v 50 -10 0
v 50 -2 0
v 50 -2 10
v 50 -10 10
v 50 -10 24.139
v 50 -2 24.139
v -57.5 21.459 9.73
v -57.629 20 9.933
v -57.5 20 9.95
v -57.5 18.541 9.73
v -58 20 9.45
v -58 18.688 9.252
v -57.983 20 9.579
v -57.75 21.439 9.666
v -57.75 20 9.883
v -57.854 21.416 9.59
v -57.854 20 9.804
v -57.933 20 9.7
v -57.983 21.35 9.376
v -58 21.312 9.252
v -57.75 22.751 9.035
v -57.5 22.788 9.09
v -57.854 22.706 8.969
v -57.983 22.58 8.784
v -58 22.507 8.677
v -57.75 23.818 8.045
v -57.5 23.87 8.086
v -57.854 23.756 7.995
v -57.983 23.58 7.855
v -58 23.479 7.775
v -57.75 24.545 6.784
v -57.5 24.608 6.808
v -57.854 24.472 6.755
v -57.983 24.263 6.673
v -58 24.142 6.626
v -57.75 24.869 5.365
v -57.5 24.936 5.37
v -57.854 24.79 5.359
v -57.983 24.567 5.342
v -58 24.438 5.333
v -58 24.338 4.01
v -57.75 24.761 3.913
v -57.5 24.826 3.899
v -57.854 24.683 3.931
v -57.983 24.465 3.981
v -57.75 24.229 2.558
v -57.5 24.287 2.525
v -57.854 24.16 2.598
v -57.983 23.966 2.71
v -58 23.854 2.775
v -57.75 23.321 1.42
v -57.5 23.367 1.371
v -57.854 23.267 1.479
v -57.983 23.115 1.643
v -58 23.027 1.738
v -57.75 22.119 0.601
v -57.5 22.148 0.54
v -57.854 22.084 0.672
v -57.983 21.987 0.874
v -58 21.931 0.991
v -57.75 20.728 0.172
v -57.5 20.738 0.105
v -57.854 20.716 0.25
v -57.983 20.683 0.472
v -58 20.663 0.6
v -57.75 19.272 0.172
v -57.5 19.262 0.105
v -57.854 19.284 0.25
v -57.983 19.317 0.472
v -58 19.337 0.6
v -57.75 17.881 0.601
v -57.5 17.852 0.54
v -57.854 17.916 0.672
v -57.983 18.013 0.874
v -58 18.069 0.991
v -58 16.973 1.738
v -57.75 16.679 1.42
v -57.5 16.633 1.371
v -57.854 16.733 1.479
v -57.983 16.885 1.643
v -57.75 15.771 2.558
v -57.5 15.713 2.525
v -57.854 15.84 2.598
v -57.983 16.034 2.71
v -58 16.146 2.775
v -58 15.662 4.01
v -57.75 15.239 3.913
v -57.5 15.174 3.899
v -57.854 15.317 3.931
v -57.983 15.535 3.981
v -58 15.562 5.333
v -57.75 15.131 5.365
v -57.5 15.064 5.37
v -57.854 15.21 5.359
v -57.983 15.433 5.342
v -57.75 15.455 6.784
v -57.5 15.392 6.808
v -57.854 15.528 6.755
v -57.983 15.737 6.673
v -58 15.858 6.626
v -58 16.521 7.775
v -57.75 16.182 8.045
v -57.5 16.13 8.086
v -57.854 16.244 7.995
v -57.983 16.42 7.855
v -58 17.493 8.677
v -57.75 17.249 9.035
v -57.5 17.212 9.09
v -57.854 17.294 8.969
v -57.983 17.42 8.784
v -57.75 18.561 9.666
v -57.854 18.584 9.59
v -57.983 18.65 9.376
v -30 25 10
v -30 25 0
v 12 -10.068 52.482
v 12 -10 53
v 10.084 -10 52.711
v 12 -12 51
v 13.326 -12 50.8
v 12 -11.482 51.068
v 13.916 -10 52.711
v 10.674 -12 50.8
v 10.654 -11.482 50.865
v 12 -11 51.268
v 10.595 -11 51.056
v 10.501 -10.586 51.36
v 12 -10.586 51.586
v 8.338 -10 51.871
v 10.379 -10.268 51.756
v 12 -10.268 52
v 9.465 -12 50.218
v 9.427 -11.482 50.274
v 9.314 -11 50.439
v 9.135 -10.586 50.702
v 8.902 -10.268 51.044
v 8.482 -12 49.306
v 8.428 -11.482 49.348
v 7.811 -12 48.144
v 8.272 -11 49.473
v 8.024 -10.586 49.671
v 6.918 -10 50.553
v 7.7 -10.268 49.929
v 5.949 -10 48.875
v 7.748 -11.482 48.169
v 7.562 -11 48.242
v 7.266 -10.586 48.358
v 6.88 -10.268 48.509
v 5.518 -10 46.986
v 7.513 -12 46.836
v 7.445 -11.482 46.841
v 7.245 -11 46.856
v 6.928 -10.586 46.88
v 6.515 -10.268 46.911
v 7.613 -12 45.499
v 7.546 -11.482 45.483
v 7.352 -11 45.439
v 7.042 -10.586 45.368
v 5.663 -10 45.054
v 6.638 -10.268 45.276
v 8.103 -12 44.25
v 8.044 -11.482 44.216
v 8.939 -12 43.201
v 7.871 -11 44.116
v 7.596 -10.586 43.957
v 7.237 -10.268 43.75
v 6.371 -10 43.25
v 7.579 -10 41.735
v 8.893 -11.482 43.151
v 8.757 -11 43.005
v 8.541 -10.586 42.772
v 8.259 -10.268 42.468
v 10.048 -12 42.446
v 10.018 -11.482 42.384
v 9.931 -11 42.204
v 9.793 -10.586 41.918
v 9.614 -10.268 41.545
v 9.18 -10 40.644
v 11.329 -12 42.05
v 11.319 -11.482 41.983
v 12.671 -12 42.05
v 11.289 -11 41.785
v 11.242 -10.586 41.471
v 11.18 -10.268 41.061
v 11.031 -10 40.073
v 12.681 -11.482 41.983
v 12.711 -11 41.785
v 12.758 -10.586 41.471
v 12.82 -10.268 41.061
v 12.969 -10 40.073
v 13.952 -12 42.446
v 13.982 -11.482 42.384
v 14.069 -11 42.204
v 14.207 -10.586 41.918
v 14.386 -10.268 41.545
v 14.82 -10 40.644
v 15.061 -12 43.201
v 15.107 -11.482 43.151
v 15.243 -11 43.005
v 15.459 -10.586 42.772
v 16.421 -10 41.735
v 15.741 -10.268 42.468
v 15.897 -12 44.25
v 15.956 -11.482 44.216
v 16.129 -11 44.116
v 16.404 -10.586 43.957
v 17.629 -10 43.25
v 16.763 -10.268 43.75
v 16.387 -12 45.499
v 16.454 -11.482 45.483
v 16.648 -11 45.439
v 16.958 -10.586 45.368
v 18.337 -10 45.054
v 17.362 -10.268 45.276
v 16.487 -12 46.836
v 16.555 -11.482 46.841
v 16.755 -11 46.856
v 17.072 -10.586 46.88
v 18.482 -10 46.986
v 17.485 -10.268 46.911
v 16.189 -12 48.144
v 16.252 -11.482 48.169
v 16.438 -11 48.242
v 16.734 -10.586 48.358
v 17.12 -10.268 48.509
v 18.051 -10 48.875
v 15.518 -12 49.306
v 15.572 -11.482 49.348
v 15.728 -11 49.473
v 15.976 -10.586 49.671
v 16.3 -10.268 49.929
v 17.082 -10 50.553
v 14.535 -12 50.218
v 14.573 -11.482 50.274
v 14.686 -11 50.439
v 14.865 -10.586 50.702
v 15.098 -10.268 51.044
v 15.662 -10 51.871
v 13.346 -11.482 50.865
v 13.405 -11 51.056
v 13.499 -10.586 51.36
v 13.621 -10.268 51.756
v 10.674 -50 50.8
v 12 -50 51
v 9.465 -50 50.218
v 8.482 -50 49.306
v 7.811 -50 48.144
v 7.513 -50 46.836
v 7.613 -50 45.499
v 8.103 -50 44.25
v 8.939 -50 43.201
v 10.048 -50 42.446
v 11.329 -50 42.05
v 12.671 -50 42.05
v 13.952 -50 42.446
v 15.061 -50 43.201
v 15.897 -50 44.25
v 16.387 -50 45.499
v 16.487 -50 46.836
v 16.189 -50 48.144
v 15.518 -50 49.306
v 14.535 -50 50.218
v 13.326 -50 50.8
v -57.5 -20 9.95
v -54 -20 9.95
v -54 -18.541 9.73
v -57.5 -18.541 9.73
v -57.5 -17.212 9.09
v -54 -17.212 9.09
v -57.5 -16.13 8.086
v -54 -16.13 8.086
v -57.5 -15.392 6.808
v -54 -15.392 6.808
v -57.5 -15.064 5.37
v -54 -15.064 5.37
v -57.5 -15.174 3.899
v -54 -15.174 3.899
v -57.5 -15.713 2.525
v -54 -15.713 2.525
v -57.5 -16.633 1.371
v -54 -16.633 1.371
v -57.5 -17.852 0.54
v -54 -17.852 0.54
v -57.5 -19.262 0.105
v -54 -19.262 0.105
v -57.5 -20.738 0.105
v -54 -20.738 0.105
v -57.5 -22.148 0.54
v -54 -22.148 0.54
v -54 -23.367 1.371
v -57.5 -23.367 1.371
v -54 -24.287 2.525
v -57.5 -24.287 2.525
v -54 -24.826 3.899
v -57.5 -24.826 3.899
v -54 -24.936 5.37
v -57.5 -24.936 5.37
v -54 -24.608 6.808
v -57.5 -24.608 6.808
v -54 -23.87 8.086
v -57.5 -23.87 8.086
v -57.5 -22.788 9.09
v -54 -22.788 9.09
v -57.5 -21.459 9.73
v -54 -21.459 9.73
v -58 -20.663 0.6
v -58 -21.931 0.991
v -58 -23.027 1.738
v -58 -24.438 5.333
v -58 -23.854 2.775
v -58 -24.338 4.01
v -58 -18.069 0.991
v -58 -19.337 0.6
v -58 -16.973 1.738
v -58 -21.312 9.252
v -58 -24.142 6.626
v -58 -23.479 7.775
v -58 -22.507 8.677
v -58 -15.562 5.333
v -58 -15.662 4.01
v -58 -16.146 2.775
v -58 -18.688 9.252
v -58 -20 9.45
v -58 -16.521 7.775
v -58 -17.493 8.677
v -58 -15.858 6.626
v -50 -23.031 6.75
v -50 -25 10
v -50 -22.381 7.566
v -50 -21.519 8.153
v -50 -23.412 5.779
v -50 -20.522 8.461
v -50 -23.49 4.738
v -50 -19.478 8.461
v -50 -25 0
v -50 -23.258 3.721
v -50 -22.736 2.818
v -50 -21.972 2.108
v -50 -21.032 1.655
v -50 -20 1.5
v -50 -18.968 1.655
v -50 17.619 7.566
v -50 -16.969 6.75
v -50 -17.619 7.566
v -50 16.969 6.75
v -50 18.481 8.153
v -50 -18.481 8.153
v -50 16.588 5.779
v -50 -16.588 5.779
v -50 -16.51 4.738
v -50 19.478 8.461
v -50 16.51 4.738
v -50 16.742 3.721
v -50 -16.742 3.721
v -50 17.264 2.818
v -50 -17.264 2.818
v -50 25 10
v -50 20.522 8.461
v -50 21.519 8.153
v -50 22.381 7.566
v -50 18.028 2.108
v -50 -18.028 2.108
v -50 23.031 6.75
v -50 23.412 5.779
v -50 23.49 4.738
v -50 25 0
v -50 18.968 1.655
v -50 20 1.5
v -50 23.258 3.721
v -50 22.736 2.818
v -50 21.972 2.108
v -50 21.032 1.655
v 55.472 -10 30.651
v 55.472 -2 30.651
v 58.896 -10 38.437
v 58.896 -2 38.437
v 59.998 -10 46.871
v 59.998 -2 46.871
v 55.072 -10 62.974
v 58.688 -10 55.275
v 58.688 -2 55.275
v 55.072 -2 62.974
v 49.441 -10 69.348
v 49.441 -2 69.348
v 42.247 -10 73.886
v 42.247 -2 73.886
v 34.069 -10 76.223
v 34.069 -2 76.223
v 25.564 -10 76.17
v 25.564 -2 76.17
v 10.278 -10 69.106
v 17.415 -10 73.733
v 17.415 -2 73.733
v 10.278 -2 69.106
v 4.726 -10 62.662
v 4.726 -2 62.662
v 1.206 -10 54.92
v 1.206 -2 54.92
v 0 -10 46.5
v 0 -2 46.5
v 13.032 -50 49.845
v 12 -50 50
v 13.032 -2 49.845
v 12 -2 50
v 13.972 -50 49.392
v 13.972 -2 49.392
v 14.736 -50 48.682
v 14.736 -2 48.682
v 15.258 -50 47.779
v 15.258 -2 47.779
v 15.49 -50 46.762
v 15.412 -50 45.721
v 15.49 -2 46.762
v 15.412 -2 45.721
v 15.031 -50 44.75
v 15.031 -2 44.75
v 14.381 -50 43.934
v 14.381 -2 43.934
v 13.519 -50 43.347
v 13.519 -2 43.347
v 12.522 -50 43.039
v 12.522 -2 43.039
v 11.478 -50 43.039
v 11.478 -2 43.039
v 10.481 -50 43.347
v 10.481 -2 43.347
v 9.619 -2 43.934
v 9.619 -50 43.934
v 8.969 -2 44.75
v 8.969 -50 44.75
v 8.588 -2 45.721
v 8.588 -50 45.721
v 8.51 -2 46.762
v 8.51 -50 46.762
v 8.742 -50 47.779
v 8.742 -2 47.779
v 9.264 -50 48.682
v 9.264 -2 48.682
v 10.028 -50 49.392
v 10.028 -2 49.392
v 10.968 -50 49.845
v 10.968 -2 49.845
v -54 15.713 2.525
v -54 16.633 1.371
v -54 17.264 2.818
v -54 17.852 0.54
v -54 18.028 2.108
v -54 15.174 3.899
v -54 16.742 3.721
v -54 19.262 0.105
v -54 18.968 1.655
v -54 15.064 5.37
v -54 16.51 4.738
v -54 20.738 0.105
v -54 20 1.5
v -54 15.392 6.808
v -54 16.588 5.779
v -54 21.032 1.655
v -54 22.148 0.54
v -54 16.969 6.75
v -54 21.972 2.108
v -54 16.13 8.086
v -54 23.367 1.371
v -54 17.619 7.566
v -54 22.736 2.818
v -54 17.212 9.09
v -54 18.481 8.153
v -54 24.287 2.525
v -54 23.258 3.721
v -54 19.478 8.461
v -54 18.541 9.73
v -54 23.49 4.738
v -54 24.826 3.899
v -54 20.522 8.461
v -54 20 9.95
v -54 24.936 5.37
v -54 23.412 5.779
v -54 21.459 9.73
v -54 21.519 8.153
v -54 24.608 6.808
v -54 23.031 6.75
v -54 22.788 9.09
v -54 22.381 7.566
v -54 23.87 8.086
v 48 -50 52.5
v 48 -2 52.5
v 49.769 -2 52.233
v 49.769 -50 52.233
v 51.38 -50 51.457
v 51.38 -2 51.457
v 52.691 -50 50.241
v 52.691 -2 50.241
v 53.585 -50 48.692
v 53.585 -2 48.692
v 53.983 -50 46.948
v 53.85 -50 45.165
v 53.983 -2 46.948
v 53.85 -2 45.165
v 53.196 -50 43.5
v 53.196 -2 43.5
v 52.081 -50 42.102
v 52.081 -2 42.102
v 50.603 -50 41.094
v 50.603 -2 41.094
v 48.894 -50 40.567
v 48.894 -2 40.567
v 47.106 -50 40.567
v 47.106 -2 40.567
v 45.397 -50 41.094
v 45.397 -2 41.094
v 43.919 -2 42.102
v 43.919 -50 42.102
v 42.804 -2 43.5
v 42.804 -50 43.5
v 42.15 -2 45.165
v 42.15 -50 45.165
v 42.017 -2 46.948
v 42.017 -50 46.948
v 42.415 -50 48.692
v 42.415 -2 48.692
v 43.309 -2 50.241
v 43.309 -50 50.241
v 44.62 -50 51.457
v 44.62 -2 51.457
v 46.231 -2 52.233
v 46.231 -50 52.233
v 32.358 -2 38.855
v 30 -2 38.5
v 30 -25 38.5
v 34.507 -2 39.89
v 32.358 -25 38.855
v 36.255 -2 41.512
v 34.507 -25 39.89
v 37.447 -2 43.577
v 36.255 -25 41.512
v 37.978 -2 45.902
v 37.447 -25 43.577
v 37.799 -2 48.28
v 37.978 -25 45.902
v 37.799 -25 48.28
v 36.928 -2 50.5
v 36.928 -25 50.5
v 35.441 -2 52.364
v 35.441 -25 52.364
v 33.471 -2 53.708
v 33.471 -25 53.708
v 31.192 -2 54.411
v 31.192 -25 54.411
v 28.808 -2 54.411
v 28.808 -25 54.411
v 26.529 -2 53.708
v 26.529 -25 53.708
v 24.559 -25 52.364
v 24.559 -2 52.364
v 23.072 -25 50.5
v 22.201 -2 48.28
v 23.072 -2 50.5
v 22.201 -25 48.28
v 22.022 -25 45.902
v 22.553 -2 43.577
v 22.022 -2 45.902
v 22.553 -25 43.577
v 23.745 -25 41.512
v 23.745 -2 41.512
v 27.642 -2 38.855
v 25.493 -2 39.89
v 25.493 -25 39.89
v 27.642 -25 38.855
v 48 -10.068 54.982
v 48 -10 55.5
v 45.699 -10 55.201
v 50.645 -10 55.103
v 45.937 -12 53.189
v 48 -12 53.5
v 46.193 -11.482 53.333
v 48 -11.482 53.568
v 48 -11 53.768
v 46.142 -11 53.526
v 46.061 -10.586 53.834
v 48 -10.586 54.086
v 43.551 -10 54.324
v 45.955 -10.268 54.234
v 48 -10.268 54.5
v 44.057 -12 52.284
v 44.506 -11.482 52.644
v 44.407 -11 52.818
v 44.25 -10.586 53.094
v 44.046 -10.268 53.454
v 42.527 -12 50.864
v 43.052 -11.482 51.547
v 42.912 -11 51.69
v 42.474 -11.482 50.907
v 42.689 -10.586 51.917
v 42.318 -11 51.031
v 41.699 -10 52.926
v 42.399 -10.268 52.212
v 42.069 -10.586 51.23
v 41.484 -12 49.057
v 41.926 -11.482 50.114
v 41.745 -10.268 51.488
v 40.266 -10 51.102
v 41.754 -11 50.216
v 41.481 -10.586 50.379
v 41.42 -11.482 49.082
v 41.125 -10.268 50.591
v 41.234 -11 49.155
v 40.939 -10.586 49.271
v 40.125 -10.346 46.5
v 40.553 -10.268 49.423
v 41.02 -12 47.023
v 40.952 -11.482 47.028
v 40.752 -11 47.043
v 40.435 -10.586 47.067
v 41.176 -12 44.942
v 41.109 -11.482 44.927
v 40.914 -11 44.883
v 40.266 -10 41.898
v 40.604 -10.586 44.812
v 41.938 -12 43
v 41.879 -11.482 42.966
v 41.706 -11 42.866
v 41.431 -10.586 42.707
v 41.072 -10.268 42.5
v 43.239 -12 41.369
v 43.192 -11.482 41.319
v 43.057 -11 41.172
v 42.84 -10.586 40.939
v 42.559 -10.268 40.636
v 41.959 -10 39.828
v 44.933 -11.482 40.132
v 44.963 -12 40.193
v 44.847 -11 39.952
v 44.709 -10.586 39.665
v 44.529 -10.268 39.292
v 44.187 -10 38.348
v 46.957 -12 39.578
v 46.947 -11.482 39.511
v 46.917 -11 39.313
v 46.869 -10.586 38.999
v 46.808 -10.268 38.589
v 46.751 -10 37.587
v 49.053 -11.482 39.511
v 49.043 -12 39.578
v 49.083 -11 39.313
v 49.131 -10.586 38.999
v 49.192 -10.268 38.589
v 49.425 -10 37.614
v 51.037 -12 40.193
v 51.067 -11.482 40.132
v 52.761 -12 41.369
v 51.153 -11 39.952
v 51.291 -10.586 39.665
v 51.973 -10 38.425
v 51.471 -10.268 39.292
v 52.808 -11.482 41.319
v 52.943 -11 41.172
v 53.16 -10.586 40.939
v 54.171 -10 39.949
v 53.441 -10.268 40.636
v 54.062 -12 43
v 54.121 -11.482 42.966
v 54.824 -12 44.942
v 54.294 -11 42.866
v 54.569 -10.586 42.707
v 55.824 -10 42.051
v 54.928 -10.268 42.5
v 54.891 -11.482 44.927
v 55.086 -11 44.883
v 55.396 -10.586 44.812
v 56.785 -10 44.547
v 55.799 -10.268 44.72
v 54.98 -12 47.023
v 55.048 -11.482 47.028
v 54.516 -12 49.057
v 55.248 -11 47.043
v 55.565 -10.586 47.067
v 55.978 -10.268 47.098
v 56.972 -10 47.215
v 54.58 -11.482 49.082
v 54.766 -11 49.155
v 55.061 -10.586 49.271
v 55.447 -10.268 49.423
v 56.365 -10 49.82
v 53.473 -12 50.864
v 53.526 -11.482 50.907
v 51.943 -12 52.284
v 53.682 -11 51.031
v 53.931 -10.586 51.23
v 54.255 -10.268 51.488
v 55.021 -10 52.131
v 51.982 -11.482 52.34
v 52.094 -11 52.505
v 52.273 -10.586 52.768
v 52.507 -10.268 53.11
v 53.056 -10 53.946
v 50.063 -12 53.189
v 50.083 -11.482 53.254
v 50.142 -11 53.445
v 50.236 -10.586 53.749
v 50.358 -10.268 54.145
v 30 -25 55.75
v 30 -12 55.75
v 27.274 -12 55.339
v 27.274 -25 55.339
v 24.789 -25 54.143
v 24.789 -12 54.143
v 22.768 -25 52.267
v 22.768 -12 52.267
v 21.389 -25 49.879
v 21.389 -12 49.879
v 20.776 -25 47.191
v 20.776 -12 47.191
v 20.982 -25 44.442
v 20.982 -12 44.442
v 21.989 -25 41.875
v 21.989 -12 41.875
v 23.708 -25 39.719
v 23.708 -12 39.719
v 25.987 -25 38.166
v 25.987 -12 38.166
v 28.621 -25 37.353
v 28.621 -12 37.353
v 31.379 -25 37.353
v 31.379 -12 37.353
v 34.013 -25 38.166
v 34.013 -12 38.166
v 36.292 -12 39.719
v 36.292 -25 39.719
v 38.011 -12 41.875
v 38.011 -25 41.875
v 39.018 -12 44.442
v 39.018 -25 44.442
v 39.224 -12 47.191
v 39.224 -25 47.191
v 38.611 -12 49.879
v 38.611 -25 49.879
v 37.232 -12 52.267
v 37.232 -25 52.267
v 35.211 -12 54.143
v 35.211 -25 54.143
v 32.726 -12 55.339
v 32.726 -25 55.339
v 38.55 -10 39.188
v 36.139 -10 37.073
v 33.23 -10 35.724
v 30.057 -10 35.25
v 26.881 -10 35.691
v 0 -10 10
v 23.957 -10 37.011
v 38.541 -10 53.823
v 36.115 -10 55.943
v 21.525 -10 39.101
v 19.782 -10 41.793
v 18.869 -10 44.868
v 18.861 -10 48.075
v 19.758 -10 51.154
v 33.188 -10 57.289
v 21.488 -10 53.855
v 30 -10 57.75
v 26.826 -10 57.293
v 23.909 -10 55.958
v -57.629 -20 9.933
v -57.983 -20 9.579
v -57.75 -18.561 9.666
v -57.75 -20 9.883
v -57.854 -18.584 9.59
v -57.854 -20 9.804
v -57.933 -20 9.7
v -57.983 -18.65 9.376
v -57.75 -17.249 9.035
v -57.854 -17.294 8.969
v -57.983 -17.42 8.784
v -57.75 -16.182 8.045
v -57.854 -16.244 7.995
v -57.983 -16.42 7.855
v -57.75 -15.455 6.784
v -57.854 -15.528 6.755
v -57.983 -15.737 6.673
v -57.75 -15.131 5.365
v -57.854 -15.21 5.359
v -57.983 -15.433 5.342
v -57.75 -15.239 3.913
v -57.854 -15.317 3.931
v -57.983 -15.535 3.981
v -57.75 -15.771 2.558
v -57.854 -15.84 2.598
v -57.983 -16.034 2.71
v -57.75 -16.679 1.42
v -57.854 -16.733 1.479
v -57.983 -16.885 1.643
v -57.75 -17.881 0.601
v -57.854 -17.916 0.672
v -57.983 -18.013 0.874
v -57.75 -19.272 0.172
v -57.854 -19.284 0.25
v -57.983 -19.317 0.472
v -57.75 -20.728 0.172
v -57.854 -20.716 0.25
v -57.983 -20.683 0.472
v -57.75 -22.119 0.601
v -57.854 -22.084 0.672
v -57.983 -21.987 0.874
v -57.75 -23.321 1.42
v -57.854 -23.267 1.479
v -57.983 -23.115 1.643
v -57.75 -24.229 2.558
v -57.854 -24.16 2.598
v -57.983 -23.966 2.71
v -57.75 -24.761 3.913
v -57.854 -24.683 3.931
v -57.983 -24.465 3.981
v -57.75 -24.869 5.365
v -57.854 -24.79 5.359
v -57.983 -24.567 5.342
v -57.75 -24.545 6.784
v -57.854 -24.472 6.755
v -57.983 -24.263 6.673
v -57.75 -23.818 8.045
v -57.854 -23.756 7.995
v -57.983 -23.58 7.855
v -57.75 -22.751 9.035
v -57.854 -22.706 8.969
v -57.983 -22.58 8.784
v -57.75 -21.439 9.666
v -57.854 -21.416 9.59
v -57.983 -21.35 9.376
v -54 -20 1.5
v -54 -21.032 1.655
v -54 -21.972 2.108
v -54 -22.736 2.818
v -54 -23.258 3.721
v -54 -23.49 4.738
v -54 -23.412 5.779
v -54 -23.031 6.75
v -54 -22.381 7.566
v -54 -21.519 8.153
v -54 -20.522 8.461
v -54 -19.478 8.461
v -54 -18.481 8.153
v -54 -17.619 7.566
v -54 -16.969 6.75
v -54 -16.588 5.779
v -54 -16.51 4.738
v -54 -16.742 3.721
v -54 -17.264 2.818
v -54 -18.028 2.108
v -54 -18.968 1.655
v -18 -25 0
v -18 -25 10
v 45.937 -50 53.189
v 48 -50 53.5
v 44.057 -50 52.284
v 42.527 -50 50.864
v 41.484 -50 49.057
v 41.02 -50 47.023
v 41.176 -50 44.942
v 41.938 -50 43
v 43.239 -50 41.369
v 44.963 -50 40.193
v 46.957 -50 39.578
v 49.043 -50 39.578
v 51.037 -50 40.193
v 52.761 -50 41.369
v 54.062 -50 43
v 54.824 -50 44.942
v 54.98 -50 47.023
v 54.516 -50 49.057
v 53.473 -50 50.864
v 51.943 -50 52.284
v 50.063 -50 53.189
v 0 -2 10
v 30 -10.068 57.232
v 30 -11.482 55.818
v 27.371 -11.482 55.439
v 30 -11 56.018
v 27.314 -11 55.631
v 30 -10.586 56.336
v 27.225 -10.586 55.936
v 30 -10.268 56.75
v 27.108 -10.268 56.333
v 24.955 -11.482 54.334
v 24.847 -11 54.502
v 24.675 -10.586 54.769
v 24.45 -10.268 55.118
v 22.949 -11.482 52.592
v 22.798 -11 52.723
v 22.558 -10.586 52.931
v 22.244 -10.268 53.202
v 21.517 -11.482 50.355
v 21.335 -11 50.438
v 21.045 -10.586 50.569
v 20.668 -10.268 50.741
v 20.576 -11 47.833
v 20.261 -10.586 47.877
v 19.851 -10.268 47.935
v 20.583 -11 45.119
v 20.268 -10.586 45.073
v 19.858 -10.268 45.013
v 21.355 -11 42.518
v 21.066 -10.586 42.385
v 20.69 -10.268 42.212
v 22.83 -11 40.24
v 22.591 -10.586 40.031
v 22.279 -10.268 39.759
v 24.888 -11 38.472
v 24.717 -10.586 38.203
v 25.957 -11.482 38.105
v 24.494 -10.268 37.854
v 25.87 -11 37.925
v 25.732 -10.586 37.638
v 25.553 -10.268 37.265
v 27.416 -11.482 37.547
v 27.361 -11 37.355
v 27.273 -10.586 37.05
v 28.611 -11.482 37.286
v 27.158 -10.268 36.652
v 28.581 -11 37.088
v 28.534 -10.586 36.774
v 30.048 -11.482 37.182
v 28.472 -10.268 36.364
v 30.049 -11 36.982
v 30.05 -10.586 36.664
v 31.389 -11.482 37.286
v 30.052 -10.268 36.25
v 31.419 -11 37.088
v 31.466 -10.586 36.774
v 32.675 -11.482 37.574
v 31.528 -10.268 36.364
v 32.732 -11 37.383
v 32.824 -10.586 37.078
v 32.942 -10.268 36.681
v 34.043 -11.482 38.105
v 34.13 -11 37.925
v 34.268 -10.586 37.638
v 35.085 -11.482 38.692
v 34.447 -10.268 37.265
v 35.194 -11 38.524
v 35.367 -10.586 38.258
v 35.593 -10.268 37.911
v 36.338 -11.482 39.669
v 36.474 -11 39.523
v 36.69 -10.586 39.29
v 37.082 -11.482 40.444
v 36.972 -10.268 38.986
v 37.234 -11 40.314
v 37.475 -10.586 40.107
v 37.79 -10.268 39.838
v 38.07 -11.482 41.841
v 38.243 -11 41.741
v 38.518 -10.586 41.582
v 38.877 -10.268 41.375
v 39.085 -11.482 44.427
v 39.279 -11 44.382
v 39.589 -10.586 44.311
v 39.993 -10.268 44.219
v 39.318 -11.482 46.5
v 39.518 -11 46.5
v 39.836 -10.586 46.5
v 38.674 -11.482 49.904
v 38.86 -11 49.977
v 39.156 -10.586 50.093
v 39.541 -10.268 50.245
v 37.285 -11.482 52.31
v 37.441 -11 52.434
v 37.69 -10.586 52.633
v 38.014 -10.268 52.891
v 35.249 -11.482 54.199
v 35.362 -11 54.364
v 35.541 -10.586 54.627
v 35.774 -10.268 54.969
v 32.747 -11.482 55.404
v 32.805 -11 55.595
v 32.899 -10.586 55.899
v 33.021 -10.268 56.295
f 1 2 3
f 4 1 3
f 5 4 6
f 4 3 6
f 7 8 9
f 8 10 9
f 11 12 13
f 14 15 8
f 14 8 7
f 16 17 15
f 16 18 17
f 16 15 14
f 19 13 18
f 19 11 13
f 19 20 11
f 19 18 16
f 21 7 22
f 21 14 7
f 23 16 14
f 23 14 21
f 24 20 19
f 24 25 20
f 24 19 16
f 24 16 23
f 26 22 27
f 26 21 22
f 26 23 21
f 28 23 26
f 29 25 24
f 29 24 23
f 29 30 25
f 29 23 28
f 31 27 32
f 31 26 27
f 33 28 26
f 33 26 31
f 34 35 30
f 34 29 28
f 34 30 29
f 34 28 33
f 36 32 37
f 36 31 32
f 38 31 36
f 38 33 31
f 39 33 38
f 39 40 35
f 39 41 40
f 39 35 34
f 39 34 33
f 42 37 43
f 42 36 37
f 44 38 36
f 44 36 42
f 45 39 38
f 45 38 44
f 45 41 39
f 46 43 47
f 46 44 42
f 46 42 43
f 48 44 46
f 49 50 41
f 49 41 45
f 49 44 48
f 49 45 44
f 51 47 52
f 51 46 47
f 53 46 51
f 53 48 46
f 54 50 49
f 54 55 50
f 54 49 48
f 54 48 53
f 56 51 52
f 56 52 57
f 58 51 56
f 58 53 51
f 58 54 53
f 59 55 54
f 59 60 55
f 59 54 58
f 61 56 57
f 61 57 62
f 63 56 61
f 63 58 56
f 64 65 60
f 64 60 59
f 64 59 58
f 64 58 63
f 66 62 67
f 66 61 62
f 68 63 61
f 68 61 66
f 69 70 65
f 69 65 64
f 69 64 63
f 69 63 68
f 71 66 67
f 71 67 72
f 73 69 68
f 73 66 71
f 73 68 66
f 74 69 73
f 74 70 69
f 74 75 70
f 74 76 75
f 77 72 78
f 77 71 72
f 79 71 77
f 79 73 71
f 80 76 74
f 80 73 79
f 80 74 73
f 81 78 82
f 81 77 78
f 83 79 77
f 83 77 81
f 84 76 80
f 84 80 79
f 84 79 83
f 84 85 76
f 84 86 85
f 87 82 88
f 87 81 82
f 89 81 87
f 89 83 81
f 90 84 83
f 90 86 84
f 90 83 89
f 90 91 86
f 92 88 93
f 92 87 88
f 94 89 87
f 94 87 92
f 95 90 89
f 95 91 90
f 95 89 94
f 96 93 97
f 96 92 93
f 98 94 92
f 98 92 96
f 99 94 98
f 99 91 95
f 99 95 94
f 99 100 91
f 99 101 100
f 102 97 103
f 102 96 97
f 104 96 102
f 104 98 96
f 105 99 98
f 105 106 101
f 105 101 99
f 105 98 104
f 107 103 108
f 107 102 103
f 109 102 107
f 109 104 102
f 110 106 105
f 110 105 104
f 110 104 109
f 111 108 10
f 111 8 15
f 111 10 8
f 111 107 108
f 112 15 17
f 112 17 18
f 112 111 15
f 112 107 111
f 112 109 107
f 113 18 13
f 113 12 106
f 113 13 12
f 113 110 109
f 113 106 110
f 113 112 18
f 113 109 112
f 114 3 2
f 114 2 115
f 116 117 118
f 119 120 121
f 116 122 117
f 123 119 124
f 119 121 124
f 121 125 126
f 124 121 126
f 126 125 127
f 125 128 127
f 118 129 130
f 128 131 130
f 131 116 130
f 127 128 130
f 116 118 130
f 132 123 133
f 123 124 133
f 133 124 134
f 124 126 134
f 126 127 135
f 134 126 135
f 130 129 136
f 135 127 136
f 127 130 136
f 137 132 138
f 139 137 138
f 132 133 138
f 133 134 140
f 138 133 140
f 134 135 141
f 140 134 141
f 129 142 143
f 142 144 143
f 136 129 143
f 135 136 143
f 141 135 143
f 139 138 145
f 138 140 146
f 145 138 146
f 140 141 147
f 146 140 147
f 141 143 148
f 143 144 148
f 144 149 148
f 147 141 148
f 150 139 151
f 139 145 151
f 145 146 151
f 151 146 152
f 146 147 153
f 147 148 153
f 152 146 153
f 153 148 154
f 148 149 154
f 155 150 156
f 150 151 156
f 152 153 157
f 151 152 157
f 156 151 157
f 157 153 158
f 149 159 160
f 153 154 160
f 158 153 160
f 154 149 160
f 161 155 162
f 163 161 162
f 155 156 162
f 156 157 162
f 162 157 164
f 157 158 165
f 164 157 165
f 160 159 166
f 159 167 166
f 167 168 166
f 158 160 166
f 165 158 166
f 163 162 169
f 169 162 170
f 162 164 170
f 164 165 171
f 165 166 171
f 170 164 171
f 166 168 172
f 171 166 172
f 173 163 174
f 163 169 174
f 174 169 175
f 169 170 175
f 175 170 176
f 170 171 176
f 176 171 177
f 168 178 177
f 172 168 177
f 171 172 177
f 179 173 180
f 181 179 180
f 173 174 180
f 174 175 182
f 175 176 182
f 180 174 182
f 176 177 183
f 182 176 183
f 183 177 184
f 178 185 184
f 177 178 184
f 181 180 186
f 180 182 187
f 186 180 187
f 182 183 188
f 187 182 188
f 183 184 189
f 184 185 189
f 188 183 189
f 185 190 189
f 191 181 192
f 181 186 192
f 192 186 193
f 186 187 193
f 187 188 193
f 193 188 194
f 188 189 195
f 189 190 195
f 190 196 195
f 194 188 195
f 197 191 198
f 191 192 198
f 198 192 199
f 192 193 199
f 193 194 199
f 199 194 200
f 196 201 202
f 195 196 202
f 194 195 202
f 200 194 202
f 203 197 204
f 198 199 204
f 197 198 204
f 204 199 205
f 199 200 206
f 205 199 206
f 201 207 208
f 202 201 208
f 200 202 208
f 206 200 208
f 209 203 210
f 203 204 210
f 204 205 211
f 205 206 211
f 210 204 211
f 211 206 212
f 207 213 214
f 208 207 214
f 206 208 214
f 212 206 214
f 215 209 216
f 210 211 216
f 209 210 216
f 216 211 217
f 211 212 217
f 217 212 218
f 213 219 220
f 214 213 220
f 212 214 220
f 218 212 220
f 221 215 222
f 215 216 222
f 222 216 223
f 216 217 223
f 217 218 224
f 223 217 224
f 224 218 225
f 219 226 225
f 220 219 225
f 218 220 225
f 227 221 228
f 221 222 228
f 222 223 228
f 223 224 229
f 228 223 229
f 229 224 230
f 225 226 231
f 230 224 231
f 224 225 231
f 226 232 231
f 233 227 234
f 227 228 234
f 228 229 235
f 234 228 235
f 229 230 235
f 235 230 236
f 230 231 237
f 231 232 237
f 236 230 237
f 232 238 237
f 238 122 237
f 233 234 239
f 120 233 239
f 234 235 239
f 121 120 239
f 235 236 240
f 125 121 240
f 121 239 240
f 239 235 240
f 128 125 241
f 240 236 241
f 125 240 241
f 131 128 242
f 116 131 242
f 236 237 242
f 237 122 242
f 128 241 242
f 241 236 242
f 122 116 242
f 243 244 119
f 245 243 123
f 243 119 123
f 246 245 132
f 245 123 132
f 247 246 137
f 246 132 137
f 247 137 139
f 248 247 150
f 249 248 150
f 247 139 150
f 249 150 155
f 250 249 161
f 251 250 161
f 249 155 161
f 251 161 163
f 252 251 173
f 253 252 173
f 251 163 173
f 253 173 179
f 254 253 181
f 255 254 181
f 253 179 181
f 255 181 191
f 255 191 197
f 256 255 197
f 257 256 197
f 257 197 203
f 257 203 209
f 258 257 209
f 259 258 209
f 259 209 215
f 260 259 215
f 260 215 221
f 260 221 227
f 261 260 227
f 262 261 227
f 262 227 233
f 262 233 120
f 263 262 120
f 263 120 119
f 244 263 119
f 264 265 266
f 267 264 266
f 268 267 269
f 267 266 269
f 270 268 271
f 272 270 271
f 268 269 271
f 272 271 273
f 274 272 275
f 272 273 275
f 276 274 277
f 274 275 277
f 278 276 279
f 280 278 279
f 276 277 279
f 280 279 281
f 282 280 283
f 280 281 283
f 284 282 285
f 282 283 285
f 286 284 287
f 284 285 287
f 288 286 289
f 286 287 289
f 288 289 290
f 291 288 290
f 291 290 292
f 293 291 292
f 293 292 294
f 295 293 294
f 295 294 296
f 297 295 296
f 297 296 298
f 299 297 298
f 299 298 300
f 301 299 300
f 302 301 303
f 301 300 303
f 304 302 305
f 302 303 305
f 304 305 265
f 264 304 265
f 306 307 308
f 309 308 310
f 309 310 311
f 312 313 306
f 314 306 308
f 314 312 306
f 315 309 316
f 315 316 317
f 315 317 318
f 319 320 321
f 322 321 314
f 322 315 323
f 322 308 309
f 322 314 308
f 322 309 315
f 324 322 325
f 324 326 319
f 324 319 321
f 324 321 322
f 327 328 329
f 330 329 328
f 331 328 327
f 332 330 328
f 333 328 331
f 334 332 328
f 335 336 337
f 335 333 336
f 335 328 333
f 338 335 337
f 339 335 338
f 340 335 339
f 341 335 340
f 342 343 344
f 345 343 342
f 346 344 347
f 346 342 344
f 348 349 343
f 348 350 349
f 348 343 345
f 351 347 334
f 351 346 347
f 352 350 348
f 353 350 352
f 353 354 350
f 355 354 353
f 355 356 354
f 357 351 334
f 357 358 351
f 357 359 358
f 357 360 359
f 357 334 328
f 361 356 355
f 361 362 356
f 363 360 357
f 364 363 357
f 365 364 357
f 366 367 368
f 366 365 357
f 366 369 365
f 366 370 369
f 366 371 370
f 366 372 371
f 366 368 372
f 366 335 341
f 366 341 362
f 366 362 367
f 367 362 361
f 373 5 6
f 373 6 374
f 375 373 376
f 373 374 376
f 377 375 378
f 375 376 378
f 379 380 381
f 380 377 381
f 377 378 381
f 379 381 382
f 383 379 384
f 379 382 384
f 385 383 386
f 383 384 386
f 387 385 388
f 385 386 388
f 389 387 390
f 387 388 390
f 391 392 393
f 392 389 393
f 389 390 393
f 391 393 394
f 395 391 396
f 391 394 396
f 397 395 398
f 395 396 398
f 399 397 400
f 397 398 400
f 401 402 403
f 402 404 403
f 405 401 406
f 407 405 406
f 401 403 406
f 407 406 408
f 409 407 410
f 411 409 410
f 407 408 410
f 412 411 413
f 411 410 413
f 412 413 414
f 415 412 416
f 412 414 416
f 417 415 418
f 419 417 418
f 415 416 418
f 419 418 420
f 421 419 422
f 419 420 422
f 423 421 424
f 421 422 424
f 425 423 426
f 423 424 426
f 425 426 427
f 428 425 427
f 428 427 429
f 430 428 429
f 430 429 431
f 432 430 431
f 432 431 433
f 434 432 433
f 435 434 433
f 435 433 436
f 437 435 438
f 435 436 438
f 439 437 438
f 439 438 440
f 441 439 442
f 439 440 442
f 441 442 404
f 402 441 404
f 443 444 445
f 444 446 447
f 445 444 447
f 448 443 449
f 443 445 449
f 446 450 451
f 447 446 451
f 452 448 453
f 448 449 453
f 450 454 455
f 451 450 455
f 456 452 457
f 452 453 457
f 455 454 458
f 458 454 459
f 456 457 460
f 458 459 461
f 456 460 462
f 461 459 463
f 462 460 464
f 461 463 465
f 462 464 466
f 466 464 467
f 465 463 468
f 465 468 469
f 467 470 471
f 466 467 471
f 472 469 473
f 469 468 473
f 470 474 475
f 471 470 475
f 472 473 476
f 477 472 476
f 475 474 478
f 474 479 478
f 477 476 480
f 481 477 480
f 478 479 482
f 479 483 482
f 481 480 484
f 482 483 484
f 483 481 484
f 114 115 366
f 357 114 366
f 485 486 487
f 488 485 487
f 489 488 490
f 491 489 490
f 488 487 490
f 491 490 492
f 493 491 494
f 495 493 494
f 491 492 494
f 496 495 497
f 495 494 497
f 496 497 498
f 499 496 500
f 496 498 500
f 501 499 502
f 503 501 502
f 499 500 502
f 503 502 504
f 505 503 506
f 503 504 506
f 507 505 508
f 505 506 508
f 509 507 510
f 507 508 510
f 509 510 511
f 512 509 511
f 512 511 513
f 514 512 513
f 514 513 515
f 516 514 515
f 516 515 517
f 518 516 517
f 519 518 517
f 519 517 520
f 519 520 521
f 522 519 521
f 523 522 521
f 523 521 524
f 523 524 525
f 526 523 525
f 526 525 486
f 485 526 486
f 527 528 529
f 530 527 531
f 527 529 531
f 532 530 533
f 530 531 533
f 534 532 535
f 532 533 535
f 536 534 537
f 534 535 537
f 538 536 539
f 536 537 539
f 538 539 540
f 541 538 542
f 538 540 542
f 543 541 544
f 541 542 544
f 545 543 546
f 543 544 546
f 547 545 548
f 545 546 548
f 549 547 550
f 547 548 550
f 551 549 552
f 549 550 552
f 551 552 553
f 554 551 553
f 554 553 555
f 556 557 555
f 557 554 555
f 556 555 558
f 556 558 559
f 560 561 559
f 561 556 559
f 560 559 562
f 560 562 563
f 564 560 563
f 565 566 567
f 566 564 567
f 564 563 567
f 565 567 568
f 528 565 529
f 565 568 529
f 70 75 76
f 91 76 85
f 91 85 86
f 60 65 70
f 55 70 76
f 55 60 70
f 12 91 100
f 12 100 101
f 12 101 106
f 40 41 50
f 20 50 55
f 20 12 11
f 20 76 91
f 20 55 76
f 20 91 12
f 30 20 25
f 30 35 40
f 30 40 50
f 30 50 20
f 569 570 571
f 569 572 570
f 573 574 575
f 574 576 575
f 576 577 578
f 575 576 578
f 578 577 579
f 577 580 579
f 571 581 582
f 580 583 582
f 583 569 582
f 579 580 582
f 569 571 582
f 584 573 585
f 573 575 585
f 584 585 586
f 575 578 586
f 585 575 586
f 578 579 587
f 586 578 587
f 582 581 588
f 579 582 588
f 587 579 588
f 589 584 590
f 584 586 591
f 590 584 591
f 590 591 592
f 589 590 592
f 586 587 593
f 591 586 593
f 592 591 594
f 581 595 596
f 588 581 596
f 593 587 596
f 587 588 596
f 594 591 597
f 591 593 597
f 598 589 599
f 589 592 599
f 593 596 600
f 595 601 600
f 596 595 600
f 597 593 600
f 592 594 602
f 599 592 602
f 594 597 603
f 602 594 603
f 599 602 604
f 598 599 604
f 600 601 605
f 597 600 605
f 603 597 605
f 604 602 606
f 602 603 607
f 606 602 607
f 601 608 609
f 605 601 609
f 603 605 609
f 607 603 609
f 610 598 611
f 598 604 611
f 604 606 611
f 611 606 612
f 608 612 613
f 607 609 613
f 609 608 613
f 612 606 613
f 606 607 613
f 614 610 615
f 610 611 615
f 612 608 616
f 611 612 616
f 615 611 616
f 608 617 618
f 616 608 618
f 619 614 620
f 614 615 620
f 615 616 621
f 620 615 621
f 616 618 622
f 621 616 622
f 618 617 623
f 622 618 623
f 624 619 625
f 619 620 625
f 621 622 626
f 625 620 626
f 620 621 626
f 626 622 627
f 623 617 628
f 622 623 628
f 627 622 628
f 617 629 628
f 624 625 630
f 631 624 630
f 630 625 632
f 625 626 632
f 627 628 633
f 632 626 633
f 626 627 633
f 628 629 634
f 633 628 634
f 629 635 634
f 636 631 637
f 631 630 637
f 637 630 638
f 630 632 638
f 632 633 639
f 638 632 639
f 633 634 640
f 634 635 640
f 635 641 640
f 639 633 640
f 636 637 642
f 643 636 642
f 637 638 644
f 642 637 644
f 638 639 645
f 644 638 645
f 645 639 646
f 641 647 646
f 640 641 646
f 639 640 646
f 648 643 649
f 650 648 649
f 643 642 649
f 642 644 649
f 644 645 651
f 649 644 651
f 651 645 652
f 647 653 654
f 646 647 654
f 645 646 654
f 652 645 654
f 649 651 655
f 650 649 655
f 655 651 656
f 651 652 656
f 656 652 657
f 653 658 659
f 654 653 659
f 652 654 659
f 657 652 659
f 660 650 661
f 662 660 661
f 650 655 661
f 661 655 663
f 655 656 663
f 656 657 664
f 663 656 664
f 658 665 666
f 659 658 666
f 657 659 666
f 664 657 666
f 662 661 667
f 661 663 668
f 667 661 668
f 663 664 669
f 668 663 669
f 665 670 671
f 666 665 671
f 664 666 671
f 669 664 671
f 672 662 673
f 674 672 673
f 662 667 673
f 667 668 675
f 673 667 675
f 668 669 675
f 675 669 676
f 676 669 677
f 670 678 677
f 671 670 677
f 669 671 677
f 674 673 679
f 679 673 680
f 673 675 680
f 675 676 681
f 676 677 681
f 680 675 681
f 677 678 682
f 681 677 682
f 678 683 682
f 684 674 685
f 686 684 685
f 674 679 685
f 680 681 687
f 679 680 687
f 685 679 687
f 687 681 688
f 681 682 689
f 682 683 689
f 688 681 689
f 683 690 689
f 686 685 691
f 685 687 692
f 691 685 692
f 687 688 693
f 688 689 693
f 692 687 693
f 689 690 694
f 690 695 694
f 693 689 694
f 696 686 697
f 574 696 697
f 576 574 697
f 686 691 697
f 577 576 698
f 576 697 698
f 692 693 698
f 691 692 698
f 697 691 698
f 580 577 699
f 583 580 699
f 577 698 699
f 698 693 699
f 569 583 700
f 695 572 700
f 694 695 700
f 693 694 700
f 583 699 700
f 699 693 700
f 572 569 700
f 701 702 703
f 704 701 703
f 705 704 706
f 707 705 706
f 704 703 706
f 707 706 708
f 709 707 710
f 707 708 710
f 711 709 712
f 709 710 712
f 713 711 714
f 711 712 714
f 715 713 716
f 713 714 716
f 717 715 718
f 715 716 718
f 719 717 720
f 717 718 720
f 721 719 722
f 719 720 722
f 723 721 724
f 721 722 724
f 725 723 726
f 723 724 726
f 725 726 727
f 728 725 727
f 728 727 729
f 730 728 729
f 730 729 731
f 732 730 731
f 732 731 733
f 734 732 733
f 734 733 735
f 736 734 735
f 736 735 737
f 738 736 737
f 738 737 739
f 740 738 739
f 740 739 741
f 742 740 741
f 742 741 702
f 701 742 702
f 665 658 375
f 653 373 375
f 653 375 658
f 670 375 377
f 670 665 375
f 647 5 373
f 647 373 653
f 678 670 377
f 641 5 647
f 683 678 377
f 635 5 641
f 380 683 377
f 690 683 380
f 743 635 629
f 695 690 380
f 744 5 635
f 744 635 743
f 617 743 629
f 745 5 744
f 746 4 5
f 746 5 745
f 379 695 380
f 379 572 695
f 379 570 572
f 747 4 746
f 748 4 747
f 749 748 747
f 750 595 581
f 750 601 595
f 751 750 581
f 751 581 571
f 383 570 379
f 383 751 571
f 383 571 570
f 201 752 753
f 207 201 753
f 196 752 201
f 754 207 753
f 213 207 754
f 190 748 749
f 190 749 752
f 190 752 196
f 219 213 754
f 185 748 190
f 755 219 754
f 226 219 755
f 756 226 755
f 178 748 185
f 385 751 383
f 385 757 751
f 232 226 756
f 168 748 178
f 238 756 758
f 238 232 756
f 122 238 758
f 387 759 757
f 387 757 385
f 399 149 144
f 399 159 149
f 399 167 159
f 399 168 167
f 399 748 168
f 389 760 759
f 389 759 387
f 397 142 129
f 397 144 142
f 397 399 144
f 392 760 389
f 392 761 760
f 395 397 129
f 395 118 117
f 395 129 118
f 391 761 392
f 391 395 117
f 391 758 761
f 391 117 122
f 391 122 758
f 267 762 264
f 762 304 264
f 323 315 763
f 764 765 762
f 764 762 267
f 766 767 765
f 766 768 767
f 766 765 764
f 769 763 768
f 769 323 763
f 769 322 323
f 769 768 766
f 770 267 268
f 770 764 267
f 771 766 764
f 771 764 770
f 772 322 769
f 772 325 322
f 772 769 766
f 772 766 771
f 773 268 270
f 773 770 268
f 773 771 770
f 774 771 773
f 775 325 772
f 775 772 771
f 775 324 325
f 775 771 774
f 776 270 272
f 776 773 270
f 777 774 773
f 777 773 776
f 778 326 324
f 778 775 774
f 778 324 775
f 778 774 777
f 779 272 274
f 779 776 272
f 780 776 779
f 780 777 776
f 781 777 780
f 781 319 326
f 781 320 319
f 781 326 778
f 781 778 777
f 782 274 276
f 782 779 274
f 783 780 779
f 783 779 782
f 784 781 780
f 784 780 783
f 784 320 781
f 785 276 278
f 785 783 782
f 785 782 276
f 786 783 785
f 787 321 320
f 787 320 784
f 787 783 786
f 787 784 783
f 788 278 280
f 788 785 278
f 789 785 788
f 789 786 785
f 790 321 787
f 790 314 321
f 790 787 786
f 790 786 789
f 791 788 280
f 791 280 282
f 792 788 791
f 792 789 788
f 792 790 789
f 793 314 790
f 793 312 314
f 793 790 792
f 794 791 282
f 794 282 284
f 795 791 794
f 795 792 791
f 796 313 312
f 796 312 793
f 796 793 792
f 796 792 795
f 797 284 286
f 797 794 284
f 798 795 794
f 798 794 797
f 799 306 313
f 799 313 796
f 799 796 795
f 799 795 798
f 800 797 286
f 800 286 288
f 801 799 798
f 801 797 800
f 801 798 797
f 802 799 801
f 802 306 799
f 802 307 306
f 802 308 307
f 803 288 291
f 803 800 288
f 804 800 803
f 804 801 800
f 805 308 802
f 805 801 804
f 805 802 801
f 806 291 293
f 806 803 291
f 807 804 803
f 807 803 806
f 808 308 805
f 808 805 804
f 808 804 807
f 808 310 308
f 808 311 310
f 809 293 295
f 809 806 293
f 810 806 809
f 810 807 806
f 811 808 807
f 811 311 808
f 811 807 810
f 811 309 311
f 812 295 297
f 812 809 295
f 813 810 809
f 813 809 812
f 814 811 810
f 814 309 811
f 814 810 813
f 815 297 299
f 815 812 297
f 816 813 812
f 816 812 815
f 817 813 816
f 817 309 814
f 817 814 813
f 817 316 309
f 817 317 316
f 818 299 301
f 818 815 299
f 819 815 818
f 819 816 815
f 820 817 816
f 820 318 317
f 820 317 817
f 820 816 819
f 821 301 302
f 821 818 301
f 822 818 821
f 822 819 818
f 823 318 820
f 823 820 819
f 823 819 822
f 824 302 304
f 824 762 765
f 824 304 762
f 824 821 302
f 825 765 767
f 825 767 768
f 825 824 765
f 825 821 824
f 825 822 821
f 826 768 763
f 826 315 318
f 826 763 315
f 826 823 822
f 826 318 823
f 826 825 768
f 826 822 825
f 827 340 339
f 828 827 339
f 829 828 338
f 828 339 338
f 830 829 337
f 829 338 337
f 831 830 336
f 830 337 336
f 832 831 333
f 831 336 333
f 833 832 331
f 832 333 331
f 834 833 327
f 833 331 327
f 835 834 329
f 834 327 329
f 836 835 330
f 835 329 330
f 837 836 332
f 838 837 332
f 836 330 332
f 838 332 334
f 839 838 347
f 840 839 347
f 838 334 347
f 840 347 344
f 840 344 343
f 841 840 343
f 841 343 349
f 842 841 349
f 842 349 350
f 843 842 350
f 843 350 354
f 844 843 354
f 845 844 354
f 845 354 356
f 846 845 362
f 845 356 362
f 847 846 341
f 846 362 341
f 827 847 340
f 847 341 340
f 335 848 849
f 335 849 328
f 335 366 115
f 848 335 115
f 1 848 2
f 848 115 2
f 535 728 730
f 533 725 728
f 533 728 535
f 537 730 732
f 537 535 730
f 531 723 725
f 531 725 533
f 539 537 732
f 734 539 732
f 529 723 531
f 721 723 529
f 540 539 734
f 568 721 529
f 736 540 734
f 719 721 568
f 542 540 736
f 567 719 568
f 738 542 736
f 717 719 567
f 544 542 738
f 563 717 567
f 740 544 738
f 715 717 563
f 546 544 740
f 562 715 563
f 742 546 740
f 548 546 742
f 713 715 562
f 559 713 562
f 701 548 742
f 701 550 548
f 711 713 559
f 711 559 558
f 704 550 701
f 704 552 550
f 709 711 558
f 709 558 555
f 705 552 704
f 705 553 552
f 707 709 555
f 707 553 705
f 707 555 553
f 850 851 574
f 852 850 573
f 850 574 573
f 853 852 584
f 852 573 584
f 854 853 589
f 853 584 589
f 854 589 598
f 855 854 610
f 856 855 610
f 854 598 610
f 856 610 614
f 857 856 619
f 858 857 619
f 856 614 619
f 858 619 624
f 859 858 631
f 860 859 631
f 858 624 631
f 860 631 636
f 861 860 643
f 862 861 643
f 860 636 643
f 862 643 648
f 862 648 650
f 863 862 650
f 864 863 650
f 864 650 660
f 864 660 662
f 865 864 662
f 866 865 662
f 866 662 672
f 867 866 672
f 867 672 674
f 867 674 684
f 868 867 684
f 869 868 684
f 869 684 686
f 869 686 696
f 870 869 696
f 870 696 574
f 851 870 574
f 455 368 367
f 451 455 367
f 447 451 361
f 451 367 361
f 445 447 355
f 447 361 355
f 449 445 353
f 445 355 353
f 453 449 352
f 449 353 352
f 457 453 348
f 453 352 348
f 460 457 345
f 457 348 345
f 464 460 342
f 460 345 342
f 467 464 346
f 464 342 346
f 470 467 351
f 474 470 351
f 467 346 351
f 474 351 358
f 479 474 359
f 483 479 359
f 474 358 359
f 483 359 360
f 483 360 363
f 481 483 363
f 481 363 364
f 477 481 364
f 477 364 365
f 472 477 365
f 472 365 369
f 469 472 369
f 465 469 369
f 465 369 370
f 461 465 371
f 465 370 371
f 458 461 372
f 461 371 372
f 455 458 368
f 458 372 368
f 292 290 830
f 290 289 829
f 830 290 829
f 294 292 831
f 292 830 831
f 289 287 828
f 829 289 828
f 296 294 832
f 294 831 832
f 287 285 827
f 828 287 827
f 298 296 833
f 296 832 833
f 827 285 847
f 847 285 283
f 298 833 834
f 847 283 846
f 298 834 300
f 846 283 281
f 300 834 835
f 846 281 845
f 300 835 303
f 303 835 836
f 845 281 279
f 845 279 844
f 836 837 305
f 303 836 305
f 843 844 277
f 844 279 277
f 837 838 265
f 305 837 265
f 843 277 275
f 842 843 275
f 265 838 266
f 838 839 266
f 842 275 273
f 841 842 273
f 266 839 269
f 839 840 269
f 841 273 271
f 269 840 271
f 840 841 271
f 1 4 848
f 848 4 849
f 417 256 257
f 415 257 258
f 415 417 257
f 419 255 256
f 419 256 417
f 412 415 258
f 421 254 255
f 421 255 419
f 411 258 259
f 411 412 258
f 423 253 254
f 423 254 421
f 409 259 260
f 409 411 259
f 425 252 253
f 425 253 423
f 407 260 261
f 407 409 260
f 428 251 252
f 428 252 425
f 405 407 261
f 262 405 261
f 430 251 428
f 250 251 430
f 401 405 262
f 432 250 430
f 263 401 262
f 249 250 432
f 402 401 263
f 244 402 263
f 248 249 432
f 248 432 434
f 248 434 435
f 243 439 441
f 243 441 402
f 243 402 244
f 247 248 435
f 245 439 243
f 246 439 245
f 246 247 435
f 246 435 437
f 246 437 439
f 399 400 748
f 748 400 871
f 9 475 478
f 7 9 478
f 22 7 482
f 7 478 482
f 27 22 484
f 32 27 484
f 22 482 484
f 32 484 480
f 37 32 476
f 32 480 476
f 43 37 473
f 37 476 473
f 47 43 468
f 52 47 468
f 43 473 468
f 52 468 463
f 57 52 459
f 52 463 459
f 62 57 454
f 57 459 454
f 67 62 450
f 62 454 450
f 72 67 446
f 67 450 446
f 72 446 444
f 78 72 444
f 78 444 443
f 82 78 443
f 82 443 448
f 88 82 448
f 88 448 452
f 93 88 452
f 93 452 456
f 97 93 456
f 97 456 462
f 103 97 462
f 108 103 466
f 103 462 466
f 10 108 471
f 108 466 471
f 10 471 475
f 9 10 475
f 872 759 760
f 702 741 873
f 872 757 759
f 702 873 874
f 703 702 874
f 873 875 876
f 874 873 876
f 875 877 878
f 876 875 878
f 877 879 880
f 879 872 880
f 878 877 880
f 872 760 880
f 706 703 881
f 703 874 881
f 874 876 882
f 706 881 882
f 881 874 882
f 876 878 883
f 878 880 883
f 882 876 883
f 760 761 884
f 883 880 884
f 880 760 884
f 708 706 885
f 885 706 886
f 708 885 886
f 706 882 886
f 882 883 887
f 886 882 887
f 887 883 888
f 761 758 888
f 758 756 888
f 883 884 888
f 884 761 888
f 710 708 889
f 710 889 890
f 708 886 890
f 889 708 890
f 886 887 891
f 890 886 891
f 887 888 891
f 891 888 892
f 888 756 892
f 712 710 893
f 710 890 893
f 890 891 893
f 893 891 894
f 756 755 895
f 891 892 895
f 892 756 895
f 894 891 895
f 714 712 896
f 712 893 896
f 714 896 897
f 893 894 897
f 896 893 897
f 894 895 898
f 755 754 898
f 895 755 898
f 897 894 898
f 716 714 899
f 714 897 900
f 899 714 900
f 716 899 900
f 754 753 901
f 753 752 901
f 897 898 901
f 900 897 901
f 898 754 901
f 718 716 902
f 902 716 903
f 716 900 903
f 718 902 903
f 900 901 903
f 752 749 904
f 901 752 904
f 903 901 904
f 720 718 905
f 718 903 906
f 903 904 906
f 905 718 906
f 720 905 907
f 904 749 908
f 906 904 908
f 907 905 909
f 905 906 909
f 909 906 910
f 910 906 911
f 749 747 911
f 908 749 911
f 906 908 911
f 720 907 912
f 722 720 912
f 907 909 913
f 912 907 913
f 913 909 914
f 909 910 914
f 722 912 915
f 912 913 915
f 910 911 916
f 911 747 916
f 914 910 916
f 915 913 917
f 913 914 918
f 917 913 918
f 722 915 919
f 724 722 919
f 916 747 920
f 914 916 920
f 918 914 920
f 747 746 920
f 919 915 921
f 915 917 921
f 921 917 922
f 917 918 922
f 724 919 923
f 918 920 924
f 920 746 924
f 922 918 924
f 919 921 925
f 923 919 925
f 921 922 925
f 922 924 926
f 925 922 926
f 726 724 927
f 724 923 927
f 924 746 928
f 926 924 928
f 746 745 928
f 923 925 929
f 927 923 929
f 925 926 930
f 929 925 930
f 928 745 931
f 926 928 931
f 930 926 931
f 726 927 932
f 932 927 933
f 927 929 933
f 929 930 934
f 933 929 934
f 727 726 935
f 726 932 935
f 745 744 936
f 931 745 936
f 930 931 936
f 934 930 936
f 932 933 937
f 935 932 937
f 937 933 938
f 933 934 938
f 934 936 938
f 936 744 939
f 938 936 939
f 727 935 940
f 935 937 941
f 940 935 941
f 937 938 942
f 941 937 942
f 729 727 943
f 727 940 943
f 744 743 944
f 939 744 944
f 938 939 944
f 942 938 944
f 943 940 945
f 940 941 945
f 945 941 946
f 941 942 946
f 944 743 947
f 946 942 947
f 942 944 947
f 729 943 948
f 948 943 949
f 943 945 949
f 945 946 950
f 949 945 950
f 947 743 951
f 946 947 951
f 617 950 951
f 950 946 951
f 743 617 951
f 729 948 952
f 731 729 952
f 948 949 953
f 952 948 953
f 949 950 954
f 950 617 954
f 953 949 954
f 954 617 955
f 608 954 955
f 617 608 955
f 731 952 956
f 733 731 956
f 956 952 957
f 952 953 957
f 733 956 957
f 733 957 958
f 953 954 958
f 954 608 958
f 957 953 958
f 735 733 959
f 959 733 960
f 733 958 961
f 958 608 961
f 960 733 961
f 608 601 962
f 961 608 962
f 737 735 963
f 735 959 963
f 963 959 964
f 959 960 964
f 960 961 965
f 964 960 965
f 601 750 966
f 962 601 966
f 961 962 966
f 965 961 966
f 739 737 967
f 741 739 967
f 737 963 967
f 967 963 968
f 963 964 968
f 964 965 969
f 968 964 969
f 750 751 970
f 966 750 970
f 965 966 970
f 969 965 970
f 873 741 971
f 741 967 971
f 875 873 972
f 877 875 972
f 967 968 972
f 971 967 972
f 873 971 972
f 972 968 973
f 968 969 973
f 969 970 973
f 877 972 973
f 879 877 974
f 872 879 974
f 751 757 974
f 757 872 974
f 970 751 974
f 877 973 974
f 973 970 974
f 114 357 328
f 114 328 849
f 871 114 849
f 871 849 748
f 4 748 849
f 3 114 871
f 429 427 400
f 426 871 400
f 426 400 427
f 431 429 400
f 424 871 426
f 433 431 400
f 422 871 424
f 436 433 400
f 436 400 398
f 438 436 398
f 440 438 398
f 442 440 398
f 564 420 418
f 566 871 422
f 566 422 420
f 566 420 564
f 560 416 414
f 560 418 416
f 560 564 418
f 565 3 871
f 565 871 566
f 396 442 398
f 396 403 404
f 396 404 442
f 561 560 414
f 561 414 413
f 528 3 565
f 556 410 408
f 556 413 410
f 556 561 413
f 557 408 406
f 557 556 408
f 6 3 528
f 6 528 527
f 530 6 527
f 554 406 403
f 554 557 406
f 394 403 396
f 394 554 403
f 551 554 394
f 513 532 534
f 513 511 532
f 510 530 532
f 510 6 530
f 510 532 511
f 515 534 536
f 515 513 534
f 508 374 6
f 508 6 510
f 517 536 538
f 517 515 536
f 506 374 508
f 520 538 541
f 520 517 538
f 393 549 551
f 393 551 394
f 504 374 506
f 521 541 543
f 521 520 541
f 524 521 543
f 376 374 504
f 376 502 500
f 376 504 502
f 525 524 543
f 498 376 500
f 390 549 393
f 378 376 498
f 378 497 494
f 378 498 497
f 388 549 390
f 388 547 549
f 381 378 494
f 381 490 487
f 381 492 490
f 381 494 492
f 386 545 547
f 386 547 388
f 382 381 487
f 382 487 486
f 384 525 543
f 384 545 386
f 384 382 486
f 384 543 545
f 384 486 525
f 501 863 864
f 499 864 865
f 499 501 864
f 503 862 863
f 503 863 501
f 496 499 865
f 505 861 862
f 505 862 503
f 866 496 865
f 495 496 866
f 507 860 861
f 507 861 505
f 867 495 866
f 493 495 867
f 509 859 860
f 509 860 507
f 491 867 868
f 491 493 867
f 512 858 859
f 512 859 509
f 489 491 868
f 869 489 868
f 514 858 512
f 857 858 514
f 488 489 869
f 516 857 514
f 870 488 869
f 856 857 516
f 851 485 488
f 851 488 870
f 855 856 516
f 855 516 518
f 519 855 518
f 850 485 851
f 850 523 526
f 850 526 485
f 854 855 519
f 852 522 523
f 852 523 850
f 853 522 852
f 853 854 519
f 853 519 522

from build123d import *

# Parameters (mm, degrees)
SKETCH3_W               = 100
SKETCH3_H               = 50
BOSS_EXTRUDE1_DEPTH     = 10
SKETCH4_R               = 3.5
BOSS_EXTRUDE2_DEPTH     = 4
SKETCH5_R               = 4.95
BOSS_EXTRUDE3_DEPTH     = 4
BOSS_EXTRUDE4_DEPTH     = 50
CUT_EXTRUDE1_DEPTH      = 110.326346321
CUT_EXTRUDE1_DEPTH_BACK = 110.326346321
SKETCH7_R               = 8
CUT_EXTRUDE2_DEPTH      = 101.385506922
CUT_EXTRUDE2_DEPTH_BACK = 101.385506922
SKETCH10_W              = 66.5
SKETCH10_H              = 27
CUT_EXTRUDE3_DEPTH      = 93.990590922
SKETCH12_W              = 66.5
SKETCH12_H              = 15
CUT_EXTRUDE4_DEPTH      = 101.385506922
CUT_EXTRUDE5_DEPTH      = 93.990590922
SKETCH15_R              = 3.5
SKETCH15_R_2            = 6
CUT_EXTRUDE6_DEPTH      = 101.902180353
SKETCH16_R              = 4.5
SKETCH16_R_2            = 7
BOSS_EXTRUDE5_DEPTH     = 40
SKETCH17_R              = 6
SKETCH17_R_2            = 3.5
CUT_EXTRUDE7_DEPTH      = 106.129681822
SKETCH18_R              = 9.25
BOSS_EXTRUDE6_DEPTH     = 15
SKETCH19_R              = 8
CUT_EXTRUDE8_DEPTH      = 110.326346321
FILLET3_R               = 2
FILLET4_R               = 0.5


with BuildPart() as part:
    # Sketch3 → Boss-Extrude1 (new body)
    with BuildSketch(Plane.XY):
        Rectangle(SKETCH3_W, SKETCH3_H)
    extrude(amount=BOSS_EXTRUDE1_DEPTH)

    # Sketch4 → Boss-Extrude2 (add)
    with BuildSketch(Plane.ZY.offset(50)):
        with Locations(Location((5, 20, 0), (0, 0, 180))):
            Circle(SKETCH4_R)
        with Locations(Location((5, -20, 0), (0, 0, 180))):
            Circle(SKETCH4_R)
    extrude(amount=BOSS_EXTRUDE2_DEPTH)

    # Sketch5 → Boss-Extrude3 (add)
    with BuildSketch(Plane.ZY.offset(54)):
        with Locations((5, 20)):
            Circle(SKETCH5_R)
        with Locations((5, -20)):
            Circle(SKETCH5_R)
    extrude(amount=BOSS_EXTRUDE3_DEPTH)

    # Sketch6 → Boss-Extrude4 (add)
    with BuildSketch(Plane(origin=(0, 25, 0), x_dir=(1, 0, 0), z_dir=(0, 1, 0))):
        with BuildLine():
            Line((0, -46.5), (0, -10))
            Line((0, -10), (50, -10))
            Line((50, -10), (50, -24.139320225))
            ThreePointArc((50, -24.139320225), (42.247448714, -73.886127875), (0, -46.5))
        make_face()
    extrude(amount=-BOSS_EXTRUDE4_DEPTH)

    # Sketch7 → Cut-Extrude1 (cut, two sides: drawn at the far end of the back side and taken through both)
    with BuildSketch(Plane(origin=(0, 25, 0), x_dir=(1, 0, 0), z_dir=(0, 1, 0)).offset(-CUT_EXTRUDE1_DEPTH_BACK)):
        with Locations(Location((30, -46.5, 0), (0, 0, 270))):
            Circle(SKETCH7_R)
    extrude(amount=CUT_EXTRUDE1_DEPTH + CUT_EXTRUDE1_DEPTH_BACK, mode=Mode.SUBTRACT)

    # Sketch10 → Cut-Extrude2 (cut, two sides: drawn at the far end of the back side and taken through both)
    with BuildSketch(Plane.ZY.offset(-CUT_EXTRUDE2_DEPTH_BACK)):
        with Locations((43.25, 11.5)):
            Rectangle(SKETCH10_W, SKETCH10_H)
    extrude(amount=CUT_EXTRUDE2_DEPTH + CUT_EXTRUDE2_DEPTH_BACK, mode=Mode.SUBTRACT)

    # Sketch11 → Cut-Extrude3 (cut, through all)
    with BuildSketch(Plane.XY.offset(10)):
        Polygon((50, -2), (-30, 25), (50, 25), align=None)
    extrude(amount=-CUT_EXTRUDE3_DEPTH, mode=Mode.SUBTRACT)

    # Sketch12 → Cut-Extrude4 (cut, through all)
    with BuildSketch(Plane.ZY):
        with Locations((43.25, -17.5)):
            Rectangle(SKETCH12_W, SKETCH12_H)
    extrude(amount=-CUT_EXTRUDE4_DEPTH, mode=Mode.SUBTRACT)

    # Sketch13 → Cut-Extrude5 (cut, through all)
    with BuildSketch(Plane.XY.offset(10)):
        Polygon((50, -10), (-18, -25), (50, -25), align=None)
    extrude(amount=-CUT_EXTRUDE5_DEPTH, mode=Mode.SUBTRACT)

    # Sketch15 → Cut-Extrude6 (cut, through all)
    with BuildSketch(Plane(origin=(0, -2, 0), x_dir=(1, 0, 0), z_dir=(0, 1, 0))):
        with Locations(Location((12, -46.5, 0), (0, 0, 270))):
            Circle(SKETCH15_R)
        with Locations(Location((48, -46.5, 0), (0, 0, 270))):
            Circle(SKETCH15_R_2)
    extrude(amount=-CUT_EXTRUDE6_DEPTH, mode=Mode.SUBTRACT)

    # Sketch16 → Boss-Extrude5 (add)
    with BuildSketch(Plane(origin=(0, -10, 0), x_dir=(-1, 0, 0), z_dir=(0, -1, 0))):
        with Locations(Location((-12, -46.5, 0), (0, 0, 270))):
            Circle(SKETCH16_R)
        with Locations(Location((-48, -46.5, 0), (0, 0, 270))):
            Circle(SKETCH16_R_2)
    extrude(amount=BOSS_EXTRUDE5_DEPTH)

    # Sketch17 → Cut-Extrude7 (cut, through all)
    with BuildSketch(Plane(origin=(0, -10, 0), x_dir=(1, 0, 0), z_dir=(0, 1, 0))):
        with Locations(Location((48, -46.5, 0), (0, 0, 270))):
            Circle(SKETCH17_R)
        with Locations(Location((12, -46.5, 0), (0, 0, 270))):
            Circle(SKETCH17_R_2)
    extrude(amount=-CUT_EXTRUDE7_DEPTH, mode=Mode.SUBTRACT)

    # Sketch18 → Boss-Extrude6 (add)
    with BuildSketch(Plane.XZ.offset(10)):
        with Locations(Location((30, 46.5, 0), (0, 0, 90))):
            Circle(SKETCH18_R)
    extrude(amount=BOSS_EXTRUDE6_DEPTH)

    # Sketch19 → Cut-Extrude8 (cut, through all)
    with BuildSketch(Plane.XZ.offset(25)):
        with Locations(Location((30, 46.5, 0), (0, 0, 270))):
            Circle(SKETCH19_R)
    extrude(amount=-CUT_EXTRUDE8_DEPTH, mode=Mode.SUBTRACT)

    # Fillet3
    # the kernel refuses this fillet: 2 mm, written as the material it adds along each edge
    with BuildSketch(Plane(origin=(48, -10, 46.5), x_dir=(0, 0, 1), z_dir=(1, 0, 0))) as fillet3_piece_1:
        with BuildLine():
            CenterArc((7 + FILLET3_R, FILLET3_R), FILLET3_R, 180, 90)
            Line((7 + FILLET3_R, 0), (7, 0))
            Line((7, 0), (7, FILLET3_R))
        make_face()
    revolve(axis=Axis((48, -10, 46.5), (0, -1, 0)))
    with BuildSketch(Plane(origin=(12, -10, 46.5), x_dir=(0, 0, 1), z_dir=(1, 0, 0))) as fillet3_piece_2:
        with BuildLine():
            CenterArc((4.5 + FILLET3_R, FILLET3_R), FILLET3_R, 180, 90)
            Line((4.5 + FILLET3_R, 0), (4.5, 0))
            Line((4.5, 0), (4.5, FILLET3_R))
        make_face()
    revolve(axis=Axis((12, -10, 46.5), (0, -1, 0)))
    with BuildSketch(Plane(origin=(30, -10, 46.5), x_dir=(0, 0, 1), z_dir=(1, 0, 0))) as fillet3_piece_3:
        with BuildLine():
            CenterArc((9.25 + FILLET3_R, FILLET3_R), FILLET3_R, 180, 90)
            Line((9.25 + FILLET3_R, 0), (9.25, 0))
            Line((9.25, 0), (9.25, FILLET3_R))
        make_face()
    revolve(axis=Axis((30, -10, 46.5), (0, -1, 0)))

    # Fillet4
    fillet4_edges = [part.edges().sort_by_distance(p)[0] for p in [
        (-58, 20, 0.05),
        (-58, -20, 0.05),
    ]]
    fillet(fillet4_edges, radius=FILLET4_R)


solid = part.part
